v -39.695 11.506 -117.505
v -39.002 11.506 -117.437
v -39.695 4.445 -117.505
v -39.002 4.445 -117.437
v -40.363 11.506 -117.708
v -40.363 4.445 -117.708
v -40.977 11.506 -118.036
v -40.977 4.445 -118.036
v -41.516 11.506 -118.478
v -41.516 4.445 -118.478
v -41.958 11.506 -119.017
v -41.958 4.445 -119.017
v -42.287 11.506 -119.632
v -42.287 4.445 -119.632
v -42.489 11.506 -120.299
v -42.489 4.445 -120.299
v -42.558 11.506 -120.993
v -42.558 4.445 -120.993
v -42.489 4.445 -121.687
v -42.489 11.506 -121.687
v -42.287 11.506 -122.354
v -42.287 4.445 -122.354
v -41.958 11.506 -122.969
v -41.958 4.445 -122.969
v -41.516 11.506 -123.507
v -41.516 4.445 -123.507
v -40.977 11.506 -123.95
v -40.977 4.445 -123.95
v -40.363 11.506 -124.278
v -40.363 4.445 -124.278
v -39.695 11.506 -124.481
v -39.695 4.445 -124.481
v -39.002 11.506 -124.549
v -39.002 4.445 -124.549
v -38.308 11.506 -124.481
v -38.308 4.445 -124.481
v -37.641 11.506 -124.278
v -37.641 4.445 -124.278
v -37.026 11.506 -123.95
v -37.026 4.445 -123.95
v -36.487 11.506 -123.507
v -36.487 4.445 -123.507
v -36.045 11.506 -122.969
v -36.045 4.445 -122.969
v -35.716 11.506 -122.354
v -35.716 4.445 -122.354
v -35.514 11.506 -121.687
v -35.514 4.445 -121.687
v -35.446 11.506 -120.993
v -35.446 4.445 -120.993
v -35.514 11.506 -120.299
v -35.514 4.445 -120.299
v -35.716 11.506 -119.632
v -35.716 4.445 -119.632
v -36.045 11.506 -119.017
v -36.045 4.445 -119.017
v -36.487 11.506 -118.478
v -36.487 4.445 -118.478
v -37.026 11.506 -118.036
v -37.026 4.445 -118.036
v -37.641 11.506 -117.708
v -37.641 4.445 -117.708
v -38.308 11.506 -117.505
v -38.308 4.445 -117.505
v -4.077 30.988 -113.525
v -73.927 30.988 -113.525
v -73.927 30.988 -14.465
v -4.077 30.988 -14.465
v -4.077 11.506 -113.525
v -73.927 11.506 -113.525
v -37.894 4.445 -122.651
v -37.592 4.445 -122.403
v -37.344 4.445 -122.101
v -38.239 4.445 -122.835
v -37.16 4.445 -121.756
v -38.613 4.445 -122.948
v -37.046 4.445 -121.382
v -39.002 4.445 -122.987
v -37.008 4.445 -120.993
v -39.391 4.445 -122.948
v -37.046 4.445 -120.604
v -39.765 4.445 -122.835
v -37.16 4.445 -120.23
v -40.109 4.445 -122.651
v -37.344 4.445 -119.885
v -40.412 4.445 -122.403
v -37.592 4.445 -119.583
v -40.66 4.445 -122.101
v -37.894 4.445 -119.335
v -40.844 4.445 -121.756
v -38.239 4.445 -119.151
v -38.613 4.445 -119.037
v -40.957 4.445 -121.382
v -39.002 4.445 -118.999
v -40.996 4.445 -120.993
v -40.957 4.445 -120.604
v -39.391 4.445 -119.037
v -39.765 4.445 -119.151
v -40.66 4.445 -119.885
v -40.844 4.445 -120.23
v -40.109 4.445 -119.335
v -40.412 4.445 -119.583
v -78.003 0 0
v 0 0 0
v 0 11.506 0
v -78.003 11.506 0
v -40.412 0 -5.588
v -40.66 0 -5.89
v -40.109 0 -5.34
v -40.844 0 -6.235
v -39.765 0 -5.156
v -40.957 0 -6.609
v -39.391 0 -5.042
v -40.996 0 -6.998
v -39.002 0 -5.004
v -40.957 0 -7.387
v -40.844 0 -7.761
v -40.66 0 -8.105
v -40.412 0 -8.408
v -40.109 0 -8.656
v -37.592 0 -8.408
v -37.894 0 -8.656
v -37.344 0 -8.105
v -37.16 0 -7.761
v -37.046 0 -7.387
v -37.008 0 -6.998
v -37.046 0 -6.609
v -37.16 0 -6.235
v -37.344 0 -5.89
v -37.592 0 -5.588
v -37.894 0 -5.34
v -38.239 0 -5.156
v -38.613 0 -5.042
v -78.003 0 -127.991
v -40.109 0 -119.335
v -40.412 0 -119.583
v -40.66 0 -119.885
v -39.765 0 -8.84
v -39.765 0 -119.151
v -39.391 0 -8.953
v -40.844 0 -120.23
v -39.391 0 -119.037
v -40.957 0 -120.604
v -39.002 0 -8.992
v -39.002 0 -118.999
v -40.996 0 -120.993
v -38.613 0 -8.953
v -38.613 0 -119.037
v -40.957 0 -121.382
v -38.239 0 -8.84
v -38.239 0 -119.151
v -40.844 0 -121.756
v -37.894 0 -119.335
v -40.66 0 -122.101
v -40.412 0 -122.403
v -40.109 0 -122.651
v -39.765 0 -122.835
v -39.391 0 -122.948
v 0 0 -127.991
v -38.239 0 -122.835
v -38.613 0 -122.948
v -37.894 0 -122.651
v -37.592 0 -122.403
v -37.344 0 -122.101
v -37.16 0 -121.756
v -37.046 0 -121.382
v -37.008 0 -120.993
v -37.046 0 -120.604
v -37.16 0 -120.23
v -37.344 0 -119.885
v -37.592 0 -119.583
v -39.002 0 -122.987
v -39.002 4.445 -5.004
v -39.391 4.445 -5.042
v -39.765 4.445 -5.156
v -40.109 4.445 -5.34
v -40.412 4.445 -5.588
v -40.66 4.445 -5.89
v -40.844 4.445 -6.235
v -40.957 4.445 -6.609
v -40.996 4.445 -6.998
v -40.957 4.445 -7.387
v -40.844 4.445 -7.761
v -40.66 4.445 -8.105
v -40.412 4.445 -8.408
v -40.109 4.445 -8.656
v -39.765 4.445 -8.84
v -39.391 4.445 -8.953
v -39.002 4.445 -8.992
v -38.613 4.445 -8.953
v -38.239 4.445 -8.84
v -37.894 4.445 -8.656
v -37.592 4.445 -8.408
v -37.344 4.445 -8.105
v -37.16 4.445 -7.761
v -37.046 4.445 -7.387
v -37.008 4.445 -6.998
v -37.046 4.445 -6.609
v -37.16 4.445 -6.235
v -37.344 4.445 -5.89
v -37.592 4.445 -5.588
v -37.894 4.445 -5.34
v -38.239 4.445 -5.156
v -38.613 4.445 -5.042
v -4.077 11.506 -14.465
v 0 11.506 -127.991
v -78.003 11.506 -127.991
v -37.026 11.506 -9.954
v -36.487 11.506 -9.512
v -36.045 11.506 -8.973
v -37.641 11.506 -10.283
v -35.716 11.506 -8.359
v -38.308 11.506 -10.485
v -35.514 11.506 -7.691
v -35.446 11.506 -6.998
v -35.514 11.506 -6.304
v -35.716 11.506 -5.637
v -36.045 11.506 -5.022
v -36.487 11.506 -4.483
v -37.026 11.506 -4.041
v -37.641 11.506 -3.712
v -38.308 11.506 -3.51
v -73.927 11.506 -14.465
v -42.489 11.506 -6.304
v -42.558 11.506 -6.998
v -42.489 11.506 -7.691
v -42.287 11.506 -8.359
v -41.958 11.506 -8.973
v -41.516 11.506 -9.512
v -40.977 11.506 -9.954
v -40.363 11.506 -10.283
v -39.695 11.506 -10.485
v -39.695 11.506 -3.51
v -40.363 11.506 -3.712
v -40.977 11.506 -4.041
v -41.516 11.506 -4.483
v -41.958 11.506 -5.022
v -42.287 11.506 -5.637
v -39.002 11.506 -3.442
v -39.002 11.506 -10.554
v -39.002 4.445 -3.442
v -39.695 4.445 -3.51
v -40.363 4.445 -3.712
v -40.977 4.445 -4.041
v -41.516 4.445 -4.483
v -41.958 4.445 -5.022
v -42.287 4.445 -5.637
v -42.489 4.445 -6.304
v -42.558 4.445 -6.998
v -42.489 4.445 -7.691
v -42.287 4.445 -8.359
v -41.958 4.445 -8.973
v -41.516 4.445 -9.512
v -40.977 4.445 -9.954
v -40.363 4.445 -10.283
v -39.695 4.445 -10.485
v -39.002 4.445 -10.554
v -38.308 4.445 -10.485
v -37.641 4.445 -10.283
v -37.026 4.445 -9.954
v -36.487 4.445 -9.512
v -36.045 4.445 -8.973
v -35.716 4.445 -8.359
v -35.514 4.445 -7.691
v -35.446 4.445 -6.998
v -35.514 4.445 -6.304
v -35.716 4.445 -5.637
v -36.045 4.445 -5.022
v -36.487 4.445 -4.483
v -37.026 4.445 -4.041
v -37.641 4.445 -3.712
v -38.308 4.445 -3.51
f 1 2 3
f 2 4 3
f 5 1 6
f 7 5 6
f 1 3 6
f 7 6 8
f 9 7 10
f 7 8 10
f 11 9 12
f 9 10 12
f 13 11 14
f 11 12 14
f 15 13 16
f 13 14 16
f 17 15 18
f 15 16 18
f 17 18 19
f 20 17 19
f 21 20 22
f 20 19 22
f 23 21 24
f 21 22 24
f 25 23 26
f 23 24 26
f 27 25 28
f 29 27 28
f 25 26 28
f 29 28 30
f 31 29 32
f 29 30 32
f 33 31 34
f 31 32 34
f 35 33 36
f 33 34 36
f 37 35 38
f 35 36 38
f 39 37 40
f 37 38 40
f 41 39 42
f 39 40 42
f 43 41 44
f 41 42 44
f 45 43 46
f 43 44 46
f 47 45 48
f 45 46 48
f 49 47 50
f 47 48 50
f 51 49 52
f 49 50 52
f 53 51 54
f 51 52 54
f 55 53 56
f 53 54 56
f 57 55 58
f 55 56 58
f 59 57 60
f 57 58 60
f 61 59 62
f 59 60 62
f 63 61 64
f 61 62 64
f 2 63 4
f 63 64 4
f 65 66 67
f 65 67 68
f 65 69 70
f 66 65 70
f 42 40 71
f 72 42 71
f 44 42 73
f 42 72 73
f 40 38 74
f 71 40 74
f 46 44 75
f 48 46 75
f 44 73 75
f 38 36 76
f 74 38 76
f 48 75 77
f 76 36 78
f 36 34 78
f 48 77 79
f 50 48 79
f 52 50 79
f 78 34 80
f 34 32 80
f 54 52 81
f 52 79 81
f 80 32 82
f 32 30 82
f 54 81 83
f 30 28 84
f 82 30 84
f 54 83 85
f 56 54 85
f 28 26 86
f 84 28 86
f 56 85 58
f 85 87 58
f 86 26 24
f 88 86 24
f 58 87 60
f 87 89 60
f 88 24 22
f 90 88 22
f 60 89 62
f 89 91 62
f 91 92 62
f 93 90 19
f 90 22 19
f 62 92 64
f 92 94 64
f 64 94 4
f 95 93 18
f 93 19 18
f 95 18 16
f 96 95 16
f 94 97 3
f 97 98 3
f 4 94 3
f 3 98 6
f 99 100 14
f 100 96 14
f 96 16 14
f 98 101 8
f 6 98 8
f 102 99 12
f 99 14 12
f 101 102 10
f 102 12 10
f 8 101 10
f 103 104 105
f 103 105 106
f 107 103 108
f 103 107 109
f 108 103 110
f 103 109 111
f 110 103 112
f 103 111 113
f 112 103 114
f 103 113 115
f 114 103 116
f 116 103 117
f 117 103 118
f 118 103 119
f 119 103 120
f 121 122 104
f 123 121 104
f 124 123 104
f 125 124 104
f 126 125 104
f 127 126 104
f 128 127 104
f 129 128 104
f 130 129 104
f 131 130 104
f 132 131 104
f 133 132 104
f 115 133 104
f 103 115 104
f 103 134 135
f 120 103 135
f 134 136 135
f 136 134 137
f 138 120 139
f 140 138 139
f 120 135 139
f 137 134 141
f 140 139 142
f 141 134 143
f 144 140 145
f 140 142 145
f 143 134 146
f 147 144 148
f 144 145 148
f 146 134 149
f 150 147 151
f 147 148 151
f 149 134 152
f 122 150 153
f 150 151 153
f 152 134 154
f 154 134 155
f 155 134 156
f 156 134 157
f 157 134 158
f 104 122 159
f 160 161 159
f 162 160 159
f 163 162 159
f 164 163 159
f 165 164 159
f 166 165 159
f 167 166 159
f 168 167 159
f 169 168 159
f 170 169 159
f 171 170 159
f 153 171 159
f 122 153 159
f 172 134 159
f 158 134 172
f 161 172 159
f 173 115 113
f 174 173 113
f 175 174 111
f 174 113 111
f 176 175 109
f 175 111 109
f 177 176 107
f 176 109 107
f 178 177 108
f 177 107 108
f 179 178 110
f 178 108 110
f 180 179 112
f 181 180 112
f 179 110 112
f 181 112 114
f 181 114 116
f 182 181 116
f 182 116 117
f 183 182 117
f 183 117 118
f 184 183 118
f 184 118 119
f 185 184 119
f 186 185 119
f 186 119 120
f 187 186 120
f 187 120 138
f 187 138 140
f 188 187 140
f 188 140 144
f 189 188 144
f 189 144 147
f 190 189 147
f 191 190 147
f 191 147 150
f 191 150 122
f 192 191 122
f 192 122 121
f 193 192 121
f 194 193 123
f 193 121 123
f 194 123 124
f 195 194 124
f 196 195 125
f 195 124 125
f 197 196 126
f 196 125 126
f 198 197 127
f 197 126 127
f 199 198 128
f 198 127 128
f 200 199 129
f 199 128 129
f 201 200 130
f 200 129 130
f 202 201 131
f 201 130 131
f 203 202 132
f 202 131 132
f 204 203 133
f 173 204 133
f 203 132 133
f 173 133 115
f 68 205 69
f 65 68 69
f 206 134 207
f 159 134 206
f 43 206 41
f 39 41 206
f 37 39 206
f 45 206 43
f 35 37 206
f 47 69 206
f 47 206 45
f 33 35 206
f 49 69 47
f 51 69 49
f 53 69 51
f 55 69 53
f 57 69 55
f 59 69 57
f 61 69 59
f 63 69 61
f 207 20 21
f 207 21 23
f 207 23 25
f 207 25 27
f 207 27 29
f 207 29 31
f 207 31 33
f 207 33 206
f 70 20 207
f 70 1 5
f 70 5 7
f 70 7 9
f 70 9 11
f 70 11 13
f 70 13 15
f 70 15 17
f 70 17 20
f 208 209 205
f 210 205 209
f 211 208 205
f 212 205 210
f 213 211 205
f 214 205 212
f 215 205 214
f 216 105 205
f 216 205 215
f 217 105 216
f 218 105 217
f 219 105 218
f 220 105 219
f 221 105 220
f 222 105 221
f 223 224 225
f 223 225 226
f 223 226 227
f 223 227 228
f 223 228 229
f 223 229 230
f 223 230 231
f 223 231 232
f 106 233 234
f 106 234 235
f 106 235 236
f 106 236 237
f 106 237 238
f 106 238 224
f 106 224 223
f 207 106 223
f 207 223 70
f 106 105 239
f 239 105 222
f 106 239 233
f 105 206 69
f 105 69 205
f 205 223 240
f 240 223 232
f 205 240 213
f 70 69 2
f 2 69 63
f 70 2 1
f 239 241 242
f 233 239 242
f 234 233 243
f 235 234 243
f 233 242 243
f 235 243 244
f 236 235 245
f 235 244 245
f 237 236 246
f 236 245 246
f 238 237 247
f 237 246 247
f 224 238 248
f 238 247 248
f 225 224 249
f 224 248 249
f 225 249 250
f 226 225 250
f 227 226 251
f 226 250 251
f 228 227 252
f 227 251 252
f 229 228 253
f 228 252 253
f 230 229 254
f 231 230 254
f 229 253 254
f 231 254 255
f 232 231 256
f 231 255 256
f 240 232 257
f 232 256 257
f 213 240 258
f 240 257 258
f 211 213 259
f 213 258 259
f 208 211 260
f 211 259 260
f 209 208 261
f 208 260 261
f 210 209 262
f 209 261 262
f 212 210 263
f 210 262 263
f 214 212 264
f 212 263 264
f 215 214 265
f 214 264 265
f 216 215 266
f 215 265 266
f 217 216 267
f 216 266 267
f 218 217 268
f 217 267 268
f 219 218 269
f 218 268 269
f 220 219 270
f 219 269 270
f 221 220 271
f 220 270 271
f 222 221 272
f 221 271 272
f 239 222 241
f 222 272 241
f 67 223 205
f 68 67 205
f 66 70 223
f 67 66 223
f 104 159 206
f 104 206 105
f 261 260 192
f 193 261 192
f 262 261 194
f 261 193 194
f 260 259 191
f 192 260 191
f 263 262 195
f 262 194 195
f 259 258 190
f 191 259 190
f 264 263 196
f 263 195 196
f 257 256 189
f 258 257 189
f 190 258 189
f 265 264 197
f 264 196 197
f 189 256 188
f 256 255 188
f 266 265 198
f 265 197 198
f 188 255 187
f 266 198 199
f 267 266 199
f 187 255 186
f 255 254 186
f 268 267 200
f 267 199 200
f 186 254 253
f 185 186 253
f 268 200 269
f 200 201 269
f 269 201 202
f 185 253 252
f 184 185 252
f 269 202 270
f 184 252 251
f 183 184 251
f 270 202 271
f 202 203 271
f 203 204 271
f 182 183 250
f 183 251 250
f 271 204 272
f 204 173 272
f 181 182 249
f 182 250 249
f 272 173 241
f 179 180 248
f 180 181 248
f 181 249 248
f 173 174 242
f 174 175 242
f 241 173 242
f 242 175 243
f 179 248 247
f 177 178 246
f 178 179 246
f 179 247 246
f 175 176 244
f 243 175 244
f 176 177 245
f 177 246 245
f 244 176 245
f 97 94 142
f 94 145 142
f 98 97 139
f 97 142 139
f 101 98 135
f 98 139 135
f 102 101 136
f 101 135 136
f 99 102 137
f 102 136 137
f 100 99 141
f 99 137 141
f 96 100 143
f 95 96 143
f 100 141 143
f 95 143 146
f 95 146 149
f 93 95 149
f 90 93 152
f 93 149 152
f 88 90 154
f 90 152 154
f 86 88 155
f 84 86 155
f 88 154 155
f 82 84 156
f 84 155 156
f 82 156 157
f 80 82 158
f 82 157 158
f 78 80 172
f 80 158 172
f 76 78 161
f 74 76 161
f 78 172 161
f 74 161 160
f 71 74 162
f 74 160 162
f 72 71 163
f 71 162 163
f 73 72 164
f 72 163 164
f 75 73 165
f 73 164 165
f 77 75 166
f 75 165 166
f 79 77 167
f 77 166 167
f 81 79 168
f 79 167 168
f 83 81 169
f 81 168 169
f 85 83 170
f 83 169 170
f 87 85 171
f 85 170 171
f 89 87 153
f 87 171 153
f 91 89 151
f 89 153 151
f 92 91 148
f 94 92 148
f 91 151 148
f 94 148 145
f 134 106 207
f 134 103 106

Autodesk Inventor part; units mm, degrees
ref_plane "YZ Plane" through (0, 0, 0) normal (1, 0, 0) x (0, 1, 0)
ref_plane "XZ Plane" through (0, 0, 0) normal (0, 1, 0) x (-1, 0, 0)
ref_plane "XY Plane" through (0, 0, 0) normal (0, 0, 1) x (1, 0, 0)
sketch "Sketch1" plane through (0, 0, 0) normal (0, 1, 0) x (-1, 0, 0)
  line L0 (0, 0) -> (78.0034, 0)
  line L1 (78.0034, 0) -> (78.0034, -127.9906)
  line L2 (78.0034, -127.9906) -> (0, -127.9906)
  line L3 (0, -127.9906) -> (0, 0)
  dimension "d0" = 127.9906
  dimension "d1" = 78.0034
extrude "Extrusion1" add sketch "Sketch1" along normal blind 11.5062
sketch "Sketch2" plane through (0, 11.5062, 0) normal (0, 1, 0) x (1, 0, 0)
  line L0 (-78.0034, 0) -> (0, 0) projected
  line L1 (0, 127.9906) -> (-78.0034, 127.9906) projected
  line L2 (-39.0017, 0) -> (-39.0017, 127.9906) construction
  line L3 (-78.0034, 127.9906) -> (-78.0034, 0) construction
  line L4 (-78.0034, 63.9953) -> (0, 63.9953) construction
  line L5 (0, 0) -> (0, 127.9906) construction
  point P0 (-39.0017, 6.9977)
  point P1 (-39.0017, 120.9929)
  dimension "d4" = 113.9952
  dimension "d5" = 56.9976
hole "Hole1" at (-39.0017, 11.5062, -6.9977) at (-39.0017, 11.5062, -120.9929) direction (0, -1, 0) diameter 3.9878 depth 11.5062 counterbore diameter 7.112 counterbore depth 7.0612
sketch "Sketch3" plane through (0, 11.5062, 0) normal (0, 1, 0) x (1, 0, 0)
  line L0 (-73.9267, 14.4653) -> (-4.0767, 14.4653)
  line L1 (-4.0767, 14.4653) -> (-4.0767, 113.5253)
  line L2 (-4.0767, 113.5253) -> (-73.9267, 113.5253)
  line L3 (-73.9267, 113.5253) -> (-73.9267, 14.4653)
  line L4 (-78.0034, 0) -> (0, 0) projected
  line L5 (0, 0) -> (0, 127.9906) projected
  line L6 (0, 63.9953) -> (-78.0034, 63.9953) construction
  line L7 (-78.0034, 127.9906) -> (-78.0034, 0) projected
  line L8 (-39.0017, 0) -> (-39.0017, 127.9906) construction
  line L9 (0, 127.9906) -> (-78.0034, 127.9906) projected
  point P0 (-39.0017, 63.9953)
  dimension "d13" = 99.06
  dimension "d15" = 69.85
  dimension "d16" = 49.53
  dimension "d17" = 34.925
extrude "Extrusion2" add sketch "Sketch3" along normal blind 30.988 from surface at -11.5062 contours L3 L2 L1 L0
sketch "Sketch4" plane through (-73.9267, 30.988, -14.4653) normal (0, 1, 0) x (1, 0, 0)
  line L0 (30.8017, -0.4384) -> (30.8017, 99.4984) construction
  line L1 (30.8017, 99.4984) -> (42.6663, 99.4984) construction
  line L2 (42.6663, 99.4984) -> (42.6663, -0.4384) construction
  line L3 (42.6663, -0.4384) -> (30.8017, -0.4384) construction
  line L4 (69.85, 0) -> (0, 0) projected
  line L5 (0, 99.06) -> (69.85, 99.06) projected
  line L6 (0, 0) -> (0, 99.06) projected
  line L7 (69.85, 99.06) -> (69.85, 0) projected
  point P0 (73.9267, -14.4653)
properties part number "receiver box"
